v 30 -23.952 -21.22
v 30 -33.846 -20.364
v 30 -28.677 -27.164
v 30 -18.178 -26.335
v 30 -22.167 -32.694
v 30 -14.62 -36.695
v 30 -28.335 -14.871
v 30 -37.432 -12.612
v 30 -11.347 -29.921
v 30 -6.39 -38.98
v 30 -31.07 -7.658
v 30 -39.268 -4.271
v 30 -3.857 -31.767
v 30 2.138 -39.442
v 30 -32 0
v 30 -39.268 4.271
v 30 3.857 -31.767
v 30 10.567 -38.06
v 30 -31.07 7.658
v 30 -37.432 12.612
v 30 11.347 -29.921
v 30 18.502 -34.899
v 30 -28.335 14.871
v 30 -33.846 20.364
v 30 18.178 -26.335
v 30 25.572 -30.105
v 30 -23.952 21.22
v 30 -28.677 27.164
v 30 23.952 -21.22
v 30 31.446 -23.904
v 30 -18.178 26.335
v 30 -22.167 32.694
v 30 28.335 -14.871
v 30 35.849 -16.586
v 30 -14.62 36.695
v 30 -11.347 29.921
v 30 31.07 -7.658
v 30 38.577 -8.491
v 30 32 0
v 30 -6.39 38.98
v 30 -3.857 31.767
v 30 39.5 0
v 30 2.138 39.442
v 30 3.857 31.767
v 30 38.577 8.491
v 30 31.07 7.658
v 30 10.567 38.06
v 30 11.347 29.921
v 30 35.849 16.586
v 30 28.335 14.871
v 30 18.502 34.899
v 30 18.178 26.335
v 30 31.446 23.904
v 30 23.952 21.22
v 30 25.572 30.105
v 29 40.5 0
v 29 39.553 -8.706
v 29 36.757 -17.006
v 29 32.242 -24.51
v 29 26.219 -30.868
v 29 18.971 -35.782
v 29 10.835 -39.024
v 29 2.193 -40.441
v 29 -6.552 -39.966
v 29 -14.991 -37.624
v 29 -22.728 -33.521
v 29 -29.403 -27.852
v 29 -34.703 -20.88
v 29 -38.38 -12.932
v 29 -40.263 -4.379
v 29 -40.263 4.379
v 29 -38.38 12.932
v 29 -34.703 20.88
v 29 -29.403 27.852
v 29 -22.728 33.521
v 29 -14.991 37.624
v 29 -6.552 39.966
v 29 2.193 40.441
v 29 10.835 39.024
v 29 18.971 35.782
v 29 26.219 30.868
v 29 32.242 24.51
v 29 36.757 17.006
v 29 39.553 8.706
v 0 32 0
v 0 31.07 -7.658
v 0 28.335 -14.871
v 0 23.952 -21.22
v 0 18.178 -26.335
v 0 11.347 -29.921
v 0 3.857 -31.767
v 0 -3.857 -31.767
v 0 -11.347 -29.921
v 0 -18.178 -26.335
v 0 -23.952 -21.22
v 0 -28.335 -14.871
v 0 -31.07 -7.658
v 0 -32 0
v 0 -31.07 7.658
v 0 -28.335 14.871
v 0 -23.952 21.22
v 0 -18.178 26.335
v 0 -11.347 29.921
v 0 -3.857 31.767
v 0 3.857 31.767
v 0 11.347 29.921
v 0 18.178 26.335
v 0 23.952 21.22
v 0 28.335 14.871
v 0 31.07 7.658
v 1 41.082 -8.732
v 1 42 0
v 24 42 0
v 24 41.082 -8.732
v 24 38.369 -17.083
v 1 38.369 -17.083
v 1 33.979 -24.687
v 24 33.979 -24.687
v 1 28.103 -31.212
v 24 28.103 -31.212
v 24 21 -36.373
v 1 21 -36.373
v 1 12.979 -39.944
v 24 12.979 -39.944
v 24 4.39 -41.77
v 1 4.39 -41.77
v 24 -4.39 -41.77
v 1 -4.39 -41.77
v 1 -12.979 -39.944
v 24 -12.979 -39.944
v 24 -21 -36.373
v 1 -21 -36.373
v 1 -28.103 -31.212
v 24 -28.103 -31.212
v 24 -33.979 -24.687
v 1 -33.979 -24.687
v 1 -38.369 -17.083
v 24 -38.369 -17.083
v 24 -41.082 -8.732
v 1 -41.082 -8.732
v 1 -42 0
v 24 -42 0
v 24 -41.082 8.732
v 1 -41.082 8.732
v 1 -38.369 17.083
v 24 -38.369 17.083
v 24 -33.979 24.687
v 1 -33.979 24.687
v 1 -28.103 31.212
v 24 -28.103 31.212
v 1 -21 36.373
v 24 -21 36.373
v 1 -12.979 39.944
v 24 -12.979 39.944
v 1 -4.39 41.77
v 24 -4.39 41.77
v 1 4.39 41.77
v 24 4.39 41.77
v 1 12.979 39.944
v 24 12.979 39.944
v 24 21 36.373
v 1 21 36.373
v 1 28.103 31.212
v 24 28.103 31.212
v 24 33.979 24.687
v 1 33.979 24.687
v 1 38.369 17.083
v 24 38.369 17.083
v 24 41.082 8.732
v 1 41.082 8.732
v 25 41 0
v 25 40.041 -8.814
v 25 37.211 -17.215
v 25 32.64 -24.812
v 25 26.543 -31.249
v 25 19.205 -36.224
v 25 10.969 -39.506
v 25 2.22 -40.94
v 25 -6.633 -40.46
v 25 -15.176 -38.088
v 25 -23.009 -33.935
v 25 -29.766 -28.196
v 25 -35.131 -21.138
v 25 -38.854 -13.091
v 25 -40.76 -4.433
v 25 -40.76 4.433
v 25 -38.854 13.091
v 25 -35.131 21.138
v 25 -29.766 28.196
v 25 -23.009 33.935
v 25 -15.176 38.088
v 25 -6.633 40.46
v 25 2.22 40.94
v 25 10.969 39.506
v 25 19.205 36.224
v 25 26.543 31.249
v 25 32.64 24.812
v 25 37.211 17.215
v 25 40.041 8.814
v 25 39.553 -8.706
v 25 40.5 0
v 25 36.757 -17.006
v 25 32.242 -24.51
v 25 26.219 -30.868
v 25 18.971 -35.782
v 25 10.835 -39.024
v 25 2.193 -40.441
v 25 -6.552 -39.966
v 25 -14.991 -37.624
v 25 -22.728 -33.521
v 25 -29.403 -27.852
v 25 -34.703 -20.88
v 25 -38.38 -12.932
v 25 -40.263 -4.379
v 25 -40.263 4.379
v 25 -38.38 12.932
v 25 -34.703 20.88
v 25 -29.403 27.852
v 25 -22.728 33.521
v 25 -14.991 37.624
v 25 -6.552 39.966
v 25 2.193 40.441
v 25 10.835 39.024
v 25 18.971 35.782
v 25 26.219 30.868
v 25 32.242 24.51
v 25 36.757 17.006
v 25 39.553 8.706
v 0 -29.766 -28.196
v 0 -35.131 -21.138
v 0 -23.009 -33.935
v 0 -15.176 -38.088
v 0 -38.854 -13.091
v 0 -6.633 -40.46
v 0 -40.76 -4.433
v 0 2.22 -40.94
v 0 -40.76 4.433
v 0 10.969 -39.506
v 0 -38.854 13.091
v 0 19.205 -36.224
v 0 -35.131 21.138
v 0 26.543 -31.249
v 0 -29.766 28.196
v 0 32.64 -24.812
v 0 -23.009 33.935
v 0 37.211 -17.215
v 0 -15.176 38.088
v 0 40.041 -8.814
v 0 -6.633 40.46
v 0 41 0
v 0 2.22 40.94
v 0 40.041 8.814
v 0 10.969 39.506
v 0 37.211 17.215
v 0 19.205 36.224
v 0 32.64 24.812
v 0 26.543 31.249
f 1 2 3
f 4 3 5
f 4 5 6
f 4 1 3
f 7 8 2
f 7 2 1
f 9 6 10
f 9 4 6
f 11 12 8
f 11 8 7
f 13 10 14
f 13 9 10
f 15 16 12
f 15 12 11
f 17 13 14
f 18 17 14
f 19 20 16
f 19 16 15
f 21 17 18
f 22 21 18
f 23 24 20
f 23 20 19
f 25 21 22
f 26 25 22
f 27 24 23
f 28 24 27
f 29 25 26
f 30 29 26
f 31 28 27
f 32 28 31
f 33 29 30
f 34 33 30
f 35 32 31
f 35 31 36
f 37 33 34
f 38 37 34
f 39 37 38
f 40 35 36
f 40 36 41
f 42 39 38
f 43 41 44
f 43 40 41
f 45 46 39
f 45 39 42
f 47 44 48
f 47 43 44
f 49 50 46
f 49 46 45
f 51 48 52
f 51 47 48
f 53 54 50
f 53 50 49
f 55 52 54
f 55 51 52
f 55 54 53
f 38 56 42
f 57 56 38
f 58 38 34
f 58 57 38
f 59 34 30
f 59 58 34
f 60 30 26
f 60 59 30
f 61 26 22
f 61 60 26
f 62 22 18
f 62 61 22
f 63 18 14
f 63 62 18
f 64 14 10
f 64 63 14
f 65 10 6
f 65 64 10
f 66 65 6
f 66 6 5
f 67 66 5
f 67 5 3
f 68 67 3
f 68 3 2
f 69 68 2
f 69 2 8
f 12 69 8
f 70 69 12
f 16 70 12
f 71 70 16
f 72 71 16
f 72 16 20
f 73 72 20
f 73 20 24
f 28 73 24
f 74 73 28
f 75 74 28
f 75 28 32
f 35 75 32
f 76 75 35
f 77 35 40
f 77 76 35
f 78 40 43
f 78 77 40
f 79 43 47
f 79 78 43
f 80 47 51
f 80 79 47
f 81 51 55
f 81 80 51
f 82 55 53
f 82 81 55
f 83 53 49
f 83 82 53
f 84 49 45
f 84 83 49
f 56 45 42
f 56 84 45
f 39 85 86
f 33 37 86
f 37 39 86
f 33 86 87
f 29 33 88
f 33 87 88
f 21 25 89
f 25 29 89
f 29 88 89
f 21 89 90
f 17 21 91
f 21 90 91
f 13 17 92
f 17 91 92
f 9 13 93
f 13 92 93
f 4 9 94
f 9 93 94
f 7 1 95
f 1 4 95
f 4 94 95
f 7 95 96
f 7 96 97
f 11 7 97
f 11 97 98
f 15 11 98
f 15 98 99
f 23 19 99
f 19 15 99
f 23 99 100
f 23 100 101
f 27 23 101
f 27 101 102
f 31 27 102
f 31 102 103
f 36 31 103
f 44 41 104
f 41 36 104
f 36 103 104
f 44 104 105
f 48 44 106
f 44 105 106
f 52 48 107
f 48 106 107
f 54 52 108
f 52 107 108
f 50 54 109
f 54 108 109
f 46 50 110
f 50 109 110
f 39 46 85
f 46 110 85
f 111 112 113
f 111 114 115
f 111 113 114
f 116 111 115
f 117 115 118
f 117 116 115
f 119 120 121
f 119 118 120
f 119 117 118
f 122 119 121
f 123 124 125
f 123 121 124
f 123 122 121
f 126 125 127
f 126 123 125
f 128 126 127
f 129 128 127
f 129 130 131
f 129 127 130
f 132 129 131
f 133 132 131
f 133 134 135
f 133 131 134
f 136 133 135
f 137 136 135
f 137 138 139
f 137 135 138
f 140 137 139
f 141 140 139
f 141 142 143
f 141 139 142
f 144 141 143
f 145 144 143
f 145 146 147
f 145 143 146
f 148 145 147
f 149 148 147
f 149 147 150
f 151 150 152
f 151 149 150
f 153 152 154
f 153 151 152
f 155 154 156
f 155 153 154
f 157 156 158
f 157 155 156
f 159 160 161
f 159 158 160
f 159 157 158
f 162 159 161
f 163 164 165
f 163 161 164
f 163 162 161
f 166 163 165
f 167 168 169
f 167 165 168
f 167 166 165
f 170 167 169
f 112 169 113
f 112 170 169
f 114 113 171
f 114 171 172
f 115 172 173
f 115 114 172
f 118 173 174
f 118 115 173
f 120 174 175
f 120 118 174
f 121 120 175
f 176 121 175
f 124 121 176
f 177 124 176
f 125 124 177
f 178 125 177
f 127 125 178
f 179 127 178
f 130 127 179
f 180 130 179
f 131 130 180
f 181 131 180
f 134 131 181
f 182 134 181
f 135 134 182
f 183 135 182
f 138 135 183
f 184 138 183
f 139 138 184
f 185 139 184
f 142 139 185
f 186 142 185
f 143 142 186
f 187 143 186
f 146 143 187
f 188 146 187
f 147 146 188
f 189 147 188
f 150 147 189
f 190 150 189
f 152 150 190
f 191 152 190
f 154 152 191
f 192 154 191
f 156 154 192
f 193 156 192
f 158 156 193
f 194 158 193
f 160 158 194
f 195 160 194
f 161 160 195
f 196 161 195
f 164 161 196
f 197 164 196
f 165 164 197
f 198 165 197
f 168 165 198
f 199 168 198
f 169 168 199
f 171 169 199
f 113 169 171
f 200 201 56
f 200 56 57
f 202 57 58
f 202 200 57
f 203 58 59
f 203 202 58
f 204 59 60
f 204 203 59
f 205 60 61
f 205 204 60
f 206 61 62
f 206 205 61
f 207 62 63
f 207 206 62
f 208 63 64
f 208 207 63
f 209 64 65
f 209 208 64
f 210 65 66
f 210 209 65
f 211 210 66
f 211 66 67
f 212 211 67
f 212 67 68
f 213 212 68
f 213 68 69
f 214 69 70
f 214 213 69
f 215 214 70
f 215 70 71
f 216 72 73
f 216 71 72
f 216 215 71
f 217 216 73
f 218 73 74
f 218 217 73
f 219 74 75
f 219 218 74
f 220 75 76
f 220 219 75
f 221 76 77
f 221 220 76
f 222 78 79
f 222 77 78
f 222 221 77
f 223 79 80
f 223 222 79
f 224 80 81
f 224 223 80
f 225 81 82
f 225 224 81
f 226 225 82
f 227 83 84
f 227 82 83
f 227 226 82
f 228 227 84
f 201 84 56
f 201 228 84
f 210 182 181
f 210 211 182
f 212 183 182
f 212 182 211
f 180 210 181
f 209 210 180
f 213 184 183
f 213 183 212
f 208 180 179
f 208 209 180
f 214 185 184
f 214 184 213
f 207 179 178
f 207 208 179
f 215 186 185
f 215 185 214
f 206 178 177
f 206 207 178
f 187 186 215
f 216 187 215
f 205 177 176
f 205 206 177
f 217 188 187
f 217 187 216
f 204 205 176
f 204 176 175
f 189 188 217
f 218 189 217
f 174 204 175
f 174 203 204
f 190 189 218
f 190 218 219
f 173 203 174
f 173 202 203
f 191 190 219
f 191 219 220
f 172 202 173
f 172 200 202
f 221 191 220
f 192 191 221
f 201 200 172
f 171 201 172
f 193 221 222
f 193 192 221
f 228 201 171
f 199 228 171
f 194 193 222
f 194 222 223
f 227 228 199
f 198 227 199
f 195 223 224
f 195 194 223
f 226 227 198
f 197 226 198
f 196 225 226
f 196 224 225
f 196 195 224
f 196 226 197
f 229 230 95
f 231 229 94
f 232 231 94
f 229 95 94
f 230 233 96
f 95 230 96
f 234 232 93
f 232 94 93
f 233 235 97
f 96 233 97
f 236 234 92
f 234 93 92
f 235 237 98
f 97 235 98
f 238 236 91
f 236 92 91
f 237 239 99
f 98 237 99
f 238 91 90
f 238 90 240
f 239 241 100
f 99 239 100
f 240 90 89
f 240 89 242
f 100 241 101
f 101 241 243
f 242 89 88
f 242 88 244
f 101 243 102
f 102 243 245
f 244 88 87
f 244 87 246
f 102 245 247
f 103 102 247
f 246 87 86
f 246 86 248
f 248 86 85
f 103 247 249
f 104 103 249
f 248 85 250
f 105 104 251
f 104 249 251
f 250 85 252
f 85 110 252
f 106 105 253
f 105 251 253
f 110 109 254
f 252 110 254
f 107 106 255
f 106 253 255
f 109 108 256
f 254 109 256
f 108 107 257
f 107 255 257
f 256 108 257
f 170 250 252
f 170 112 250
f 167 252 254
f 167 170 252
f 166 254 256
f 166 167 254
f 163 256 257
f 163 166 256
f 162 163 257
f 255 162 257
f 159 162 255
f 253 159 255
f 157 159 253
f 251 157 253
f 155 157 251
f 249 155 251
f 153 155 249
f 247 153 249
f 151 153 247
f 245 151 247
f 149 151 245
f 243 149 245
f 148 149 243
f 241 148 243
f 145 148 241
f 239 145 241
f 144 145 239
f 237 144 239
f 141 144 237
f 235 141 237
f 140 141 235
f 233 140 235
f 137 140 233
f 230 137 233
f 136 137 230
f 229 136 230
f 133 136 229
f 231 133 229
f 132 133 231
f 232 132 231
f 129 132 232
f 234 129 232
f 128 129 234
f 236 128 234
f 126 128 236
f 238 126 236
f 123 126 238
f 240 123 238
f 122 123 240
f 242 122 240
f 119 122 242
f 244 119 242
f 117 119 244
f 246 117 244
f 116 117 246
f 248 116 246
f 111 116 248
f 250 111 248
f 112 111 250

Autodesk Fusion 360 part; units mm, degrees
sketch "Sketch1" plane through (0, 0, 0) normal (1, 0, 0) x (0, 1, 0)
  circle A0 centre (0, 0) radius 42
  circle A1 centre (0, 0) radius 32
  dimension "d1" = 84
  dimension "d2" = 64
extrude "Extrude1" add sketch "Sketch1" along normal blind 25
sketch "Sketch2" plane through (25, 0, 0) normal (1, 0, 0) x (0, 1, 0)
  circle A0 centre (0, 0) radius 32
  circle A1 centre (0, 0) radius 42
  circle A2 centre (0, 0) radius 32
  circle A3 centre (0, 0) radius 40.5
  dimension "d5" = 8.5
extrude "Extrude2" add sketch "Sketch2" along normal blind 5 contours A3
chamfer "Chamfer1" distance 1 angle 45 3 edges at (0, -39.1577, -15.1878) (25, -39.1577, -15.1878) (30, -37.7593, -14.6454) measured on face at (8.3333, 41.7913, -4.1818) measured on face at (25, 11.2341, 39.8428) measured on face at (30, 37.3967, -3.6019)
